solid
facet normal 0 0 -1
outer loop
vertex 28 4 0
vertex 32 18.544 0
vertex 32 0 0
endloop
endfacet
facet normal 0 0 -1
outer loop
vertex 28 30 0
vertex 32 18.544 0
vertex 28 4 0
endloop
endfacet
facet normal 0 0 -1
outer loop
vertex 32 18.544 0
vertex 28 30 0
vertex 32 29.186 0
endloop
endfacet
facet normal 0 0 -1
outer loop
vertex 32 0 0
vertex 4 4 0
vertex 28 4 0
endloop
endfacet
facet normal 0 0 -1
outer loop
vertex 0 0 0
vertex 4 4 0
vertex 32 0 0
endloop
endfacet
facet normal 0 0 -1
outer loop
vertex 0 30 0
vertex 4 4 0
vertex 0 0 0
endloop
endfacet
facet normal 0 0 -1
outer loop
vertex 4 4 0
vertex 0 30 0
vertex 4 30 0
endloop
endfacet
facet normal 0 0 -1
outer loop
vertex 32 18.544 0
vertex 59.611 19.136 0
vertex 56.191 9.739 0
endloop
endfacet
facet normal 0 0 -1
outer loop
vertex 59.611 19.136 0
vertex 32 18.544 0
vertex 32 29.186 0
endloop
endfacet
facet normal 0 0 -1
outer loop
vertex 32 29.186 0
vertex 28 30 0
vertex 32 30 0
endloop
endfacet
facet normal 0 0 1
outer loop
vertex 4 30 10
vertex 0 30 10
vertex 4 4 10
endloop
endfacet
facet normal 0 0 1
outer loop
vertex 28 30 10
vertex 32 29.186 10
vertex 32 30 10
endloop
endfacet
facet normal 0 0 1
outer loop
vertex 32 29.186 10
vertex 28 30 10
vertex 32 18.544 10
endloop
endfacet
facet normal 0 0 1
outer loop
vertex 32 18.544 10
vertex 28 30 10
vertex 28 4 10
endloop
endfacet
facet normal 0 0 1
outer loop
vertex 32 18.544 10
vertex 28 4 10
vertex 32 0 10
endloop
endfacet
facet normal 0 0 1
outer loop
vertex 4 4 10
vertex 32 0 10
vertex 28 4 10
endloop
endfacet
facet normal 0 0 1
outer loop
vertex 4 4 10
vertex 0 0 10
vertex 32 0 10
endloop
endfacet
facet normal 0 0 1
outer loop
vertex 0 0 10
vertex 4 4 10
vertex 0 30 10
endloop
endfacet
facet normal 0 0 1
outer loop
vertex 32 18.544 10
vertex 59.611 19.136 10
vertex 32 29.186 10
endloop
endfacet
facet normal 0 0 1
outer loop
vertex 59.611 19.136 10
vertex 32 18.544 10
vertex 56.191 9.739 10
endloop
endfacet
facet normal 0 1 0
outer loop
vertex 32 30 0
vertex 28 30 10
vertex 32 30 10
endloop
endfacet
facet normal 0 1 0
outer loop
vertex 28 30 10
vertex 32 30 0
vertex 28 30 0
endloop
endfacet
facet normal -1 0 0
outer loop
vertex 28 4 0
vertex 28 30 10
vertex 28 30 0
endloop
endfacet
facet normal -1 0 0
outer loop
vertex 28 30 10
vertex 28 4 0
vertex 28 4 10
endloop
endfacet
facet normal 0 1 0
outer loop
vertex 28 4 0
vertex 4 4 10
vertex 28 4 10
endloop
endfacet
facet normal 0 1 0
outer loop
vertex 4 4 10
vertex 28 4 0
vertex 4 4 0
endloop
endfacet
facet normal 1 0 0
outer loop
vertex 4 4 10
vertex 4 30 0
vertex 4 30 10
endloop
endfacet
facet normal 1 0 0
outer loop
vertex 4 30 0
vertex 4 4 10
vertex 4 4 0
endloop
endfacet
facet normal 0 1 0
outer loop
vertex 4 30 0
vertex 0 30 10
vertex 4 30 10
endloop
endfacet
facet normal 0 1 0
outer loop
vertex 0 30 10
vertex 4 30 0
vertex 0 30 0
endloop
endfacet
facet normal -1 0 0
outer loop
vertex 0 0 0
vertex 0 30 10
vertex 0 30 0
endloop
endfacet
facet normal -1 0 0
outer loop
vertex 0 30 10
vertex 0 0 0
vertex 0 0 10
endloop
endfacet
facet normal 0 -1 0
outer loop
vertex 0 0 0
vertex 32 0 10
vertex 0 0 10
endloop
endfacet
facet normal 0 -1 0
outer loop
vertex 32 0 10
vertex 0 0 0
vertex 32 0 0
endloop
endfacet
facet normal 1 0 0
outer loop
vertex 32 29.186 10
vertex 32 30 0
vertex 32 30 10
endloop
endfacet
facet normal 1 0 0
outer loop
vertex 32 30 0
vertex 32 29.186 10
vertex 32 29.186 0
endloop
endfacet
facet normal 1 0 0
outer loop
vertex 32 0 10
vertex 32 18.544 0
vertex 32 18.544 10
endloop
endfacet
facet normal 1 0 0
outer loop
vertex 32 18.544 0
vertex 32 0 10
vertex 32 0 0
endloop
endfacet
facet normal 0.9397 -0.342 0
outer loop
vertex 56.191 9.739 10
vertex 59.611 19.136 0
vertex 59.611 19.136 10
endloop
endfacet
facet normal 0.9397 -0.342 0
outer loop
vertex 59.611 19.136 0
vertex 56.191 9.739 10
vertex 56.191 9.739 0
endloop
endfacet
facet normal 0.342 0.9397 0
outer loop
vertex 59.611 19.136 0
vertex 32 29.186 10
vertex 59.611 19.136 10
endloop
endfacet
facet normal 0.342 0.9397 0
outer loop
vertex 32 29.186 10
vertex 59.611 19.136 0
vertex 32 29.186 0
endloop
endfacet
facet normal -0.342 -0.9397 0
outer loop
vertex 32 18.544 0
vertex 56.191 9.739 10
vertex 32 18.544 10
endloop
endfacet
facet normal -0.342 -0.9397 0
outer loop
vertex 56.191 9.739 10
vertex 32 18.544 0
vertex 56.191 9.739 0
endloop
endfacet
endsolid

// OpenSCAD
linear_extrude(10){

square([4, 30]);
square([24+4, 4]);
translate([24+4,0,0])
square([4, 30]);
}


translate([28,20,0])
rotate([0,0,-20])cube([30,10,10]);
